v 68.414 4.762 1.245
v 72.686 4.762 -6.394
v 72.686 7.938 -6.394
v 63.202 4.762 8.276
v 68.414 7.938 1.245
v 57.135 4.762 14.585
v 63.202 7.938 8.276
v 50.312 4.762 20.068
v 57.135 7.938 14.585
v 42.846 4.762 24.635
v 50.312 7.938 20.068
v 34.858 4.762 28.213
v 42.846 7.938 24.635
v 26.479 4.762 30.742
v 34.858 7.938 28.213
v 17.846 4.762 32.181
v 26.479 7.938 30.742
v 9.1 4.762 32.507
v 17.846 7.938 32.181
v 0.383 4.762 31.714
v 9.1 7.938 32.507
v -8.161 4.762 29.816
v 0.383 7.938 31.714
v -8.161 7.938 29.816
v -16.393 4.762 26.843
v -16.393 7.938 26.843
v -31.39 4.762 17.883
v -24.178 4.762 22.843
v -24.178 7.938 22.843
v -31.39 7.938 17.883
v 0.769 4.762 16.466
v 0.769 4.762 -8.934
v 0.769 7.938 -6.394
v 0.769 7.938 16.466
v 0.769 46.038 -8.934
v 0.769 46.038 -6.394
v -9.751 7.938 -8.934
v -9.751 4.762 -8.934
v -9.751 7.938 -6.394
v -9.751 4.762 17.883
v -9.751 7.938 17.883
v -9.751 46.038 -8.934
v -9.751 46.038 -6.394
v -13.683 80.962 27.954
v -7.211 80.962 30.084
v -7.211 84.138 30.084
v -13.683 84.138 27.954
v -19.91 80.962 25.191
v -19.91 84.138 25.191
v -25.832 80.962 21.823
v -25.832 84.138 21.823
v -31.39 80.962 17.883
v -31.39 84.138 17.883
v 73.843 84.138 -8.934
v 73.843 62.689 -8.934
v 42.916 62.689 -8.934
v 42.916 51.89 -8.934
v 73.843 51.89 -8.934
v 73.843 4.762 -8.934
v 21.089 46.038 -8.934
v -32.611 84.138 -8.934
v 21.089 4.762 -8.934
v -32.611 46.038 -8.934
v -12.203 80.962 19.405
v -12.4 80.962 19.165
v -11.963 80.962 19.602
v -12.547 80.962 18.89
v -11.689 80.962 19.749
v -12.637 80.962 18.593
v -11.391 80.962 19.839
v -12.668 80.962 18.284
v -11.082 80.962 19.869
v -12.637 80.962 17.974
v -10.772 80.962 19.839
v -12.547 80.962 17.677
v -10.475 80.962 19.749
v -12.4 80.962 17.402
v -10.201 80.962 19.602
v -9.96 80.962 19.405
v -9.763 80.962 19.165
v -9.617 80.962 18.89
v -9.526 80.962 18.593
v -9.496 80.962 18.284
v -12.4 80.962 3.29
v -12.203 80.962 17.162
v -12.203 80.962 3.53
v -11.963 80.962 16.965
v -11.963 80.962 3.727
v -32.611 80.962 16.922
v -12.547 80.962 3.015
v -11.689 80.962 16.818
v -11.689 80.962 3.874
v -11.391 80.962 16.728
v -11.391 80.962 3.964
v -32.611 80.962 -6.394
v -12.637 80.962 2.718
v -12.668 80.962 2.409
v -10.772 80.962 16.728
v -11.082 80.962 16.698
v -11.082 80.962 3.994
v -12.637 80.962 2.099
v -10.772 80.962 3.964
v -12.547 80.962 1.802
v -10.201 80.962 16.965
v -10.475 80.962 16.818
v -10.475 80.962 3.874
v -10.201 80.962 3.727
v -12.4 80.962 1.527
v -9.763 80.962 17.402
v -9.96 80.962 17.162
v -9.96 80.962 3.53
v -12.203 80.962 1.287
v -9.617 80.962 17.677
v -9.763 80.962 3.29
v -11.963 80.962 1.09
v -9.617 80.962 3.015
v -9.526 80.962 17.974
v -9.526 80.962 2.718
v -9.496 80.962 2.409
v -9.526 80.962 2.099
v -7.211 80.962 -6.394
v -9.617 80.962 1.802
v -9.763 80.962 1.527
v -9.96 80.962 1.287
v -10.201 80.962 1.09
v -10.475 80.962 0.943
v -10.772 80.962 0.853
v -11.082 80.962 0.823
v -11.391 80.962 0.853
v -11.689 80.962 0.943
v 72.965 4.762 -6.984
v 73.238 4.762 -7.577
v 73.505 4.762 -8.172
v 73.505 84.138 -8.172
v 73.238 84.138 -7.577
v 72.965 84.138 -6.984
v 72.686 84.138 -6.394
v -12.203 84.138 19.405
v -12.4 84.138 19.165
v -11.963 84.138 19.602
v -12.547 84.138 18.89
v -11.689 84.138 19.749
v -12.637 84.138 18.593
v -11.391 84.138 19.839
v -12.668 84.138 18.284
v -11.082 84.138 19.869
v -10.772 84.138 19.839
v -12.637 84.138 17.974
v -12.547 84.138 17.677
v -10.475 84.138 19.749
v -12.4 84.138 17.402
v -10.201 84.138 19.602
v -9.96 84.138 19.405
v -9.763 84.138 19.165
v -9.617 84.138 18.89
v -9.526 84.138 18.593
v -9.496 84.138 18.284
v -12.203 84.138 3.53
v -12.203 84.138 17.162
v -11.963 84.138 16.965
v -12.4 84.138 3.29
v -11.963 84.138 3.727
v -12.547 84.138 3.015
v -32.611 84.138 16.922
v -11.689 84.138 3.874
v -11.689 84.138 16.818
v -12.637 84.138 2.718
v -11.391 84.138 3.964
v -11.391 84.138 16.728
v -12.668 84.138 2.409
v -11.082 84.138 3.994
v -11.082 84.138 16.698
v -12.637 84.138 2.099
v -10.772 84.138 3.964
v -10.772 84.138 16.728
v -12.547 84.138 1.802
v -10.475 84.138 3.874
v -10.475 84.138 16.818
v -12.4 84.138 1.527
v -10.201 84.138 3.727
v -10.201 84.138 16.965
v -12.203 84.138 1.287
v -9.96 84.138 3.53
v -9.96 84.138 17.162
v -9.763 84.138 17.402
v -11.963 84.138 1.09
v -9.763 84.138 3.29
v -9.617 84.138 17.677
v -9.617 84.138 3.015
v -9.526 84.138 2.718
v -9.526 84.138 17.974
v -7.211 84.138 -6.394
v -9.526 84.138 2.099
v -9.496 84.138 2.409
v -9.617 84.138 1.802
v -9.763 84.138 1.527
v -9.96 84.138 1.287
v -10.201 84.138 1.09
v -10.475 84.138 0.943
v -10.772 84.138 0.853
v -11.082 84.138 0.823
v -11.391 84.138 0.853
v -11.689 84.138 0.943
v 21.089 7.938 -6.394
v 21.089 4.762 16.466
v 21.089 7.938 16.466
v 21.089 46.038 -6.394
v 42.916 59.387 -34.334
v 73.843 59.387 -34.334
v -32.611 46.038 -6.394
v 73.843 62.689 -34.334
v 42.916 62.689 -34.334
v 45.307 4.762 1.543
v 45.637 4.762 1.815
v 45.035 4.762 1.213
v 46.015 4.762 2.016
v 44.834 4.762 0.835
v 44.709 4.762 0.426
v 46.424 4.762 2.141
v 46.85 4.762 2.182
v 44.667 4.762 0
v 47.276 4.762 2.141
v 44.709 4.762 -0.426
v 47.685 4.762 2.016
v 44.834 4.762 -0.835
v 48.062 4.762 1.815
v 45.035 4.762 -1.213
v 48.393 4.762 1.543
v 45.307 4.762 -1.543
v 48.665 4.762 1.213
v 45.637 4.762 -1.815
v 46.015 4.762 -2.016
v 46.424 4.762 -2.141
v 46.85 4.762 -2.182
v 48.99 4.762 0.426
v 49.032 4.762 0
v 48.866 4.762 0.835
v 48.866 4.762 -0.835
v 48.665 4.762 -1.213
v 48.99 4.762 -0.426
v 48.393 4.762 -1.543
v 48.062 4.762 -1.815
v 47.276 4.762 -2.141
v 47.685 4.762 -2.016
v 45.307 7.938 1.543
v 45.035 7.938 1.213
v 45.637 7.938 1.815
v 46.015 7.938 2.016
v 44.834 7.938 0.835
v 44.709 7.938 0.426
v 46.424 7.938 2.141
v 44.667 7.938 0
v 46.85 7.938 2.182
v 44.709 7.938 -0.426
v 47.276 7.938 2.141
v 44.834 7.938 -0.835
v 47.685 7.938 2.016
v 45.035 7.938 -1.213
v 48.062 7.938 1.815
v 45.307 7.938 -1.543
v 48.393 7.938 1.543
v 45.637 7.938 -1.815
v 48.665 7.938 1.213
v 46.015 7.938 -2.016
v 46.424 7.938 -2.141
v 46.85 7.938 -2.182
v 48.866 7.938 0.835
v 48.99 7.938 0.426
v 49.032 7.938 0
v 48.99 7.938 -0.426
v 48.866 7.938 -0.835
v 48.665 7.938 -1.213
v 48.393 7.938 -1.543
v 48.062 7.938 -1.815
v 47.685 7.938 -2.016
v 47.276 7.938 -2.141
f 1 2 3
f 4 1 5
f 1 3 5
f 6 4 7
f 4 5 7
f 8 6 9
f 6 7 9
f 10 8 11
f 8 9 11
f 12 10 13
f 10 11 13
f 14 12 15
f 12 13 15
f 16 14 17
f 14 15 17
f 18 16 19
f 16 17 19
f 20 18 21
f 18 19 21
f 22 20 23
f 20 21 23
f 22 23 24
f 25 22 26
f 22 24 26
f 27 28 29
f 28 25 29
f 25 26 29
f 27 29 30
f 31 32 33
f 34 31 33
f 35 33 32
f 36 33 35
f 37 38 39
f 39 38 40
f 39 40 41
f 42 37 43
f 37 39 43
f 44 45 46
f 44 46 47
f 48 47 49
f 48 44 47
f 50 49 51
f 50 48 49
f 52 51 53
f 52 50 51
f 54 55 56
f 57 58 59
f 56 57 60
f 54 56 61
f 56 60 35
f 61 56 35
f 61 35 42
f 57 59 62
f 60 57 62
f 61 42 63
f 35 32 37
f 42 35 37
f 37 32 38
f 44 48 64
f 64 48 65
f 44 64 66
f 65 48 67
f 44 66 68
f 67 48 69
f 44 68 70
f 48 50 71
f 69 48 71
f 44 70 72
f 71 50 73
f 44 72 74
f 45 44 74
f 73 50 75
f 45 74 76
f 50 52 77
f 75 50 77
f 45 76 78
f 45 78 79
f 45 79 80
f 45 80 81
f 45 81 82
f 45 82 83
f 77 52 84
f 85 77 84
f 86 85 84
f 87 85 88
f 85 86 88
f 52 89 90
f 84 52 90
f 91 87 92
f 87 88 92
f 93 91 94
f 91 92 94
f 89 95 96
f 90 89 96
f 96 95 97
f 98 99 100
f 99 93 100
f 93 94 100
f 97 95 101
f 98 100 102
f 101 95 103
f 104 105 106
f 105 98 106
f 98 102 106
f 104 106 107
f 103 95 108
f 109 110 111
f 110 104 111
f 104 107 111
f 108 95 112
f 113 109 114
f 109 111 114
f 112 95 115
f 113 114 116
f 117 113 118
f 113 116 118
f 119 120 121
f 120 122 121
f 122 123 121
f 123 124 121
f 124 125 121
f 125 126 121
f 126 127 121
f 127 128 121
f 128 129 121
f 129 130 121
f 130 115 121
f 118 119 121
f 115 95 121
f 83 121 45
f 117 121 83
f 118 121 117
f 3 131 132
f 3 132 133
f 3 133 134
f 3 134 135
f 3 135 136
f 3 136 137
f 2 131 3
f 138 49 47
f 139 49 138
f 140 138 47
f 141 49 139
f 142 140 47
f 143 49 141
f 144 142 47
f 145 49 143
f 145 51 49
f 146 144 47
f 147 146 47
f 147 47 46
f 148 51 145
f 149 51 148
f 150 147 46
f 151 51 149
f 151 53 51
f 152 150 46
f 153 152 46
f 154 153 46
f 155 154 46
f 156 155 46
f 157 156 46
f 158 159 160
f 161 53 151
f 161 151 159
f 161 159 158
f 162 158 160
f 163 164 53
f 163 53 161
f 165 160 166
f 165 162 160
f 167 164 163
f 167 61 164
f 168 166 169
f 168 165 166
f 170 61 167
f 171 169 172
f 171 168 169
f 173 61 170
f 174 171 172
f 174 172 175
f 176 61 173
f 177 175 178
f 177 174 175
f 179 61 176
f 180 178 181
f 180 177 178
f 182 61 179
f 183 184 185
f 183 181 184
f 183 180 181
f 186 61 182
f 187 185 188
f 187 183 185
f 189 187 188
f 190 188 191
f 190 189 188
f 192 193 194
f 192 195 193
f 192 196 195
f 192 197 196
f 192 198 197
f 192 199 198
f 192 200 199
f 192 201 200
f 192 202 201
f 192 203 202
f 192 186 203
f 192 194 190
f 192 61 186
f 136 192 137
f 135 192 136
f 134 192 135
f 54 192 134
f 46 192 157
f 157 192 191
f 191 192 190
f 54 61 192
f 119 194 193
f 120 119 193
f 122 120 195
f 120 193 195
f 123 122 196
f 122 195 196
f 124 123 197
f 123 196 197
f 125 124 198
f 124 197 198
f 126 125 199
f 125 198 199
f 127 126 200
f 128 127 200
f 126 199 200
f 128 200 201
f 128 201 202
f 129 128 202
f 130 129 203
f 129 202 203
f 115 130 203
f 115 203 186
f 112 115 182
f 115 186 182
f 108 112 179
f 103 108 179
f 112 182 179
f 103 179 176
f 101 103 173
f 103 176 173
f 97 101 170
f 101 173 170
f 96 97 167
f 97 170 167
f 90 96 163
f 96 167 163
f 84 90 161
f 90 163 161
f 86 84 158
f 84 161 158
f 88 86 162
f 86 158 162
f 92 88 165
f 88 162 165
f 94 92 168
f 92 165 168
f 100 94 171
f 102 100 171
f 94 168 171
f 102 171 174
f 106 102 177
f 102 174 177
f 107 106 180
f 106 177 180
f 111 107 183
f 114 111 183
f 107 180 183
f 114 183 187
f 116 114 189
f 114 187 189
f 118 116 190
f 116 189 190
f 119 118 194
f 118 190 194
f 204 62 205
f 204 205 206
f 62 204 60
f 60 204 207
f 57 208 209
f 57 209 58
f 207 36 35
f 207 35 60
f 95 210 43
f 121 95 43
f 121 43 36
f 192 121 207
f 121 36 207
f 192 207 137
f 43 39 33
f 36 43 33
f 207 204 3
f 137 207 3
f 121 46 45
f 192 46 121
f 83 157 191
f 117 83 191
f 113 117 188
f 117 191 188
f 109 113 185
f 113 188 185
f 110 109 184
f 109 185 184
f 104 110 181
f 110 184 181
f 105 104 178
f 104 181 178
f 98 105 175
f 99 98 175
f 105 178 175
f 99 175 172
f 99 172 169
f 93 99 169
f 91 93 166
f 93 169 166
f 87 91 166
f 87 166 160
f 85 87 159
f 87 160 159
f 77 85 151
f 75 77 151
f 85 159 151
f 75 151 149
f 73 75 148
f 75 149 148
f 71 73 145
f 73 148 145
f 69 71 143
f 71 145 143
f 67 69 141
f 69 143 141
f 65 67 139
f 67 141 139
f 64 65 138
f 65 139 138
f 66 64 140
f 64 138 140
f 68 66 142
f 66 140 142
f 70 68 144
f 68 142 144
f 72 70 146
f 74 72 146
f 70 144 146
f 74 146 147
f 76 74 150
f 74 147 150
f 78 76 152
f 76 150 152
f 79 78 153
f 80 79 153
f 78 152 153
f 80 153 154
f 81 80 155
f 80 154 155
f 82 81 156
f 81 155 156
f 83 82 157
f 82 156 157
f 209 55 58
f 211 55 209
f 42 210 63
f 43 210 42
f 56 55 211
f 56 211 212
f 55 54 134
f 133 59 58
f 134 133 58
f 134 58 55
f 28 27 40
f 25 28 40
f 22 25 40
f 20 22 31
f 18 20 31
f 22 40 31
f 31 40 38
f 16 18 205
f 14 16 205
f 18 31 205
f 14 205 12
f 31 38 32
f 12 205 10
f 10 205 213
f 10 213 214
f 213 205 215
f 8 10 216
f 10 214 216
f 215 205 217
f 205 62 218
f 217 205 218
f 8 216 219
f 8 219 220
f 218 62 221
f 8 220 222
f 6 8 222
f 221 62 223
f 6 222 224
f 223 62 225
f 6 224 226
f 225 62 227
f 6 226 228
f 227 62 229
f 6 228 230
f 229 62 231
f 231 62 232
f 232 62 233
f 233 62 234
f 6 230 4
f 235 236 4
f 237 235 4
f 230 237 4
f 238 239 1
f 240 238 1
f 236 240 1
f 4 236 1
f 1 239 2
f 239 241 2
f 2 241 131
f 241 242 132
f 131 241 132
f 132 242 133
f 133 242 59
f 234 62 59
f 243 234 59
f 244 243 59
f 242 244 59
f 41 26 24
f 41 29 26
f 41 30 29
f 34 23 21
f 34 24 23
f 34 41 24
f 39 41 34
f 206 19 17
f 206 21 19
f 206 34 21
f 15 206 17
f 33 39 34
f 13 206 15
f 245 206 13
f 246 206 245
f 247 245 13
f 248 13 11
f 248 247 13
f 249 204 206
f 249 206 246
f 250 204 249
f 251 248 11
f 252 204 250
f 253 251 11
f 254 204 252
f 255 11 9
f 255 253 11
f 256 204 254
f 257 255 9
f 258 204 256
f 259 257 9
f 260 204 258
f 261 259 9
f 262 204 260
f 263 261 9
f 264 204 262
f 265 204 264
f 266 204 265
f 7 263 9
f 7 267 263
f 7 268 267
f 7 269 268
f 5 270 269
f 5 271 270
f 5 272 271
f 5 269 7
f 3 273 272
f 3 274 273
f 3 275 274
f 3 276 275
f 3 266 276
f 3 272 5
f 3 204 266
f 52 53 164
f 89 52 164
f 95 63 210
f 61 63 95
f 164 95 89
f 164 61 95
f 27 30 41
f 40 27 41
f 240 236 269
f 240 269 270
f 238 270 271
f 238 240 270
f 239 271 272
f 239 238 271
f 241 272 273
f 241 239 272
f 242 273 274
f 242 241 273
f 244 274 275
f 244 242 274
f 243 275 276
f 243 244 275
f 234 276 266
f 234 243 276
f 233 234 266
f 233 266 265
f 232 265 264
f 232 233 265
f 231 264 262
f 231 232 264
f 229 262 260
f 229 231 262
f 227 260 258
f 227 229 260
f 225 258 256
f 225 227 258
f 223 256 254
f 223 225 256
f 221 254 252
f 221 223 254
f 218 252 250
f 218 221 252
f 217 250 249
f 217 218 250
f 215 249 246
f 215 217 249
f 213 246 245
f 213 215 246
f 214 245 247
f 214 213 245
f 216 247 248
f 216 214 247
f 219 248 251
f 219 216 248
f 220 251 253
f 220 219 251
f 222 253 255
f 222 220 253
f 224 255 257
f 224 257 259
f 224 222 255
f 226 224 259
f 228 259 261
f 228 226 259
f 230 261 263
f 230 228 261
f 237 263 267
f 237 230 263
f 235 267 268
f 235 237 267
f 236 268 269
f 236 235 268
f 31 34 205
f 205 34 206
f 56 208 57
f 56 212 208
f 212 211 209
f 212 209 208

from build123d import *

# Parameters (mm, degrees)
SKETCH1_R               = 5.357495
SKETCH1_R_2             = 2.182495
RAISER_DEPTH            = 4.7625
RAISER_2_DEPTH          = 4.7625
SKETCH3_R               = 2.182495
PLATFORM_DEPTH          = 3.175
WALLS_DEPTH             = 76.2
SKETCH9_W               = 31.75
SKETCH9_H               = 3.302
BOSS_EXTRUDE4_DEPTH     = 25.4
BOSS_EXTRUDE5_DEPTH     = 31.75
BOSS_EXTRUDE6_DEPTH     = 3.175
SKETCH13_R              = 1.585905821
CUT_EXTRUDE1_DEPTH      = 3.175
SKETCH14_W              = 22.86
SKETCH14_H              = 38.1
CUT_EXTRUDE2_DEPTH      = 2.54
SKETCH16_W              = 22.86
SKETCH16_H              = 26.817011057
CUT_EXTRUDE3_DEPTH      = 5080
SKETCH17_W              = 20.32
SKETCH17_H              = 38.1
CUT_EXTRUDE4_DEPTH      = 2.54
SKETCH18_W              = 20.32
SKETCH18_H              = 25.4
CUT_EXTRUDE5_DEPTH      = 8.9375
SKETCH21_R              = 23.434999297
CUT_EXTRUDE6_DEPTH      = 5.7625
CUT_EXTRUDE7_DEPTH      = 77.2
CUT_EXTRUDE7_DEPTH_BACK = 4.175
SKETCH23_W              = 0.822798121
SKETCH23_H              = 25.4
CUT_EXTRUDE8_DEPTH      = 22.448562342
CUT_EXTRUDE8_DEPTH_BACK = 58.926437658
CUT_EXTRUDE9_DEPTH      = 1
CUT_EXTRUDE9_DEPTH_BACK = 80.375


with BuildPart() as part:
    # Sketch1 → Raiser (new body)
    with BuildSketch(Plane(origin=(0, 0, 0), x_dir=(1, 0, 0), z_dir=(0, 1, 0))):
        with Locations((-24.991443565, 0)):
            Circle(SKETCH1_R)
        with Locations((-24.991443565, 0)):
            Circle(SKETCH1_R_2, mode=Mode.SUBTRACT)
    extrude(amount=RAISER_DEPTH)



with BuildPart() as body_2:
    # Sketch1 → Raiser 2 (new body)
    with BuildSketch(Plane(origin=(0, 0, 0), x_dir=(1, 0, 0), z_dir=(0, 1, 0))):
        with Locations((46.849916435, 0)):
            Circle(SKETCH1_R)
        with Locations((46.849916435, 0)):
            Circle(SKETCH1_R_2, mode=Mode.SUBTRACT)
    extrude(amount=RAISER_2_DEPTH)


with BuildPart() as part_1:
    add(part.part)

    add(body_2.part)  # Platform merges body 2
    # Sketch3 → Platform (add)
    with BuildSketch(Plane(origin=(0, 4.7625, 0), x_dir=(1, 0, 0), z_dir=(0, 1, 0))):
        with BuildLine():
            Line((-32.611443565, 8.933868965), (-32.611443565, -17.883142092))
            ThreePointArc((-32.611443565, -17.883142092), (27.714936864, -31.227394881), (74.666125822, 8.933868965))
            Line((74.666125822, 8.933868965), (-32.611443565, 8.933868965))
        make_face()
        with Locations((-24.991443565, 0)):
            Circle(SKETCH3_R, mode=Mode.SUBTRACT)
        with Locations((46.849916435, 0)):
            Circle(SKETCH3_R, mode=Mode.SUBTRACT)
    extrude(amount=PLATFORM_DEPTH)

    # Sketch7 → Walls (add)
    with BuildSketch(Plane(origin=(0, 7.9375, 0), x_dir=(1, 0, 0), z_dir=(0, 1, 0))):
        with BuildLine():
            Line((74.666125822, 8.933868965), (-32.611443565, 8.933868965))
            Line((-32.611443565, 8.933868965), (-32.611443565, 6.393868965))
            Line((-32.611443565, 6.393868965), (-30.071443565, 6.393868965))
            Line((-30.071443565, 6.393868965), (73.529899121, 6.393868965))
            ThreePointArc((73.529899121, 6.393868965), (74.110777774, 7.65815862), (74.666125822, 8.933868965))
        make_face()
    extrude(amount=WALLS_DEPTH)

    # Sketch9 → Boss-Extrude4 (add)
    with BuildSketch(Plane(origin=(0, 0, -8.933868965), x_dir=(-1, 0, 0), z_dir=(0, 0, -1))):
        with Locations((-58.791125822, 61.037937658)):
            Rectangle(SKETCH9_W, SKETCH9_H)
    extrude(amount=BOSS_EXTRUDE4_DEPTH)

    # Sketch10 → Boss-Extrude5 (add)
    with BuildSketch(Plane.ZY.offset(-42.916125822)):
        Polygon((-34.333868965, 59.386937658), (-8.933868965, 51.890363409), (-8.933868965, 59.386937658), align=None)
    extrude(amount=-BOSS_EXTRUDE5_DEPTH)

    # Sketch12 → Boss-Extrude6 (add)
    with BuildSketch(Plane(origin=(0, 84.1375, 0), x_dir=(1, 0, 0), z_dir=(0, 1, 0))):
        with BuildLine():
            Line((-32.611443565, 6.393868965), (-32.611443565, -17.883142092))
            ThreePointArc((-32.611443565, -17.883142092), (-20.588039105, -25.701496657), (-7.211443565, -30.874079638))
            Line((-7.211443565, -30.874079638), (-7.211443565, 6.393868965))
            Line((-7.211443565, 6.393868965), (-32.611443565, 6.393868965))
        make_face()
    extrude(amount=-BOSS_EXTRUDE6_DEPTH)

    # Sketch13 → Cut-Extrude1 (cut)
    with BuildSketch(Plane(origin=(0, 84.1375, 0), x_dir=(1, 0, 0), z_dir=(0, 1, 0))):
        with Locations((-11.081791728, -2.408517057)):
            Circle(SKETCH13_R)
        with Locations((-11.081791728, -18.283517057)):
            Circle(SKETCH13_R)
    extrude(amount=-CUT_EXTRUDE1_DEPTH, mode=Mode.SUBTRACT)

    # Sketch14 → Cut-Extrude2 (cut)
    with BuildSketch(Plane.XY.offset(-6.393868965)):
        with Locations((-21.181443565, 26.9875)):
            Rectangle(SKETCH14_W, SKETCH14_H)
    extrude(amount=-CUT_EXTRUDE2_DEPTH, mode=Mode.SUBTRACT)

    # Sketch16 → Cut-Extrude3 (cut)
    with BuildSketch(Plane(origin=(0, 7.9375, 0), x_dir=(1, 0, 0), z_dir=(0, 1, 0))):
        with Locations((-21.181443565, -4.474636563)):
            Rectangle(SKETCH16_W, SKETCH16_H)
    extrude(amount=-CUT_EXTRUDE3_DEPTH, mode=Mode.SUBTRACT)

    # Sketch17 → Cut-Extrude4 (cut)
    with BuildSketch(Plane.XY.offset(-6.393868965)):
        with Locations((10.929236435, 26.9875)):
            Rectangle(SKETCH17_W, SKETCH17_H)
    extrude(amount=-CUT_EXTRUDE4_DEPTH, mode=Mode.SUBTRACT)

    # Sketch18 → Cut-Extrude5 (cut, through all)
    with BuildSketch(Plane(origin=(0, 7.9375, 0), x_dir=(1, 0, 0), z_dir=(0, 1, 0))):
        with Locations((10.929236435, -3.766131035)):
            Rectangle(SKETCH18_W, SKETCH18_H)
    extrude(amount=-CUT_EXTRUDE5_DEPTH, mode=Mode.SUBTRACT)

    # Sketch21 → Cut-Extrude6 (cut, through all)
    with BuildSketch(Plane.XZ.offset(-4.7625)):
        with Locations((35.627803811, 7.157128957)):
            Circle(SKETCH21_R)
    extrude(amount=CUT_EXTRUDE6_DEPTH, mode=Mode.SUBTRACT)

    # Sketch22 → Cut-Extrude7 (cut, two sides)
    with BuildSketch(Plane(origin=(0, 7.9375, 0), x_dir=(1, 0, 0), z_dir=(0, 1, 0))) as cut_extrude7_sk:
        with BuildLine():
            ThreePointArc((72.686340907, 6.393868965), (26.479298711, -30.742030079), (-31.389645862, -17.883142092))
            Line((-31.389645862, -17.883142092), (-32.611443565, -17.883142092))
            ThreePointArc((-32.611443565, -17.883142092), (26.361801078, -31.551234168), (73.529899121, 6.393868965))
            Line((73.529899121, 6.393868965), (72.686340907, 6.393868965))
        make_face()
        with BuildLine():
            ThreePointArc((73.505417676, 8.171868965), (73.102235438, 7.279940859), (72.686340907, 6.393868965))
            Line((72.686340907, 6.393868965), (73.529899121, 6.393868965))
            ThreePointArc((73.529899121, 6.393868965), (74.110777774, 7.65815862), (74.666125822, 8.933868965))
            Line((74.666125822, 8.933868965), (73.843327701, 8.933868965))
            Line((73.843327701, 8.933868965), (73.505417676, 8.171868965))
        make_face()
    extrude(amount=CUT_EXTRUDE7_DEPTH, mode=Mode.SUBTRACT)
    extrude(cut_extrude7_sk.sketch, amount=-CUT_EXTRUDE7_DEPTH_BACK, mode=Mode.SUBTRACT)

    # Sketch23 → Cut-Extrude8 (cut, two sides)
    with BuildSketch(Plane(origin=(0, 62.688937658, 0), x_dir=(1, 0, 0), z_dir=(0, 1, 0))) as cut_extrude8_sk:
        with Locations((74.254726761, 21.633868965)):
            Rectangle(SKETCH23_W, SKETCH23_H)
    extrude(amount=CUT_EXTRUDE8_DEPTH, mode=Mode.SUBTRACT)
    extrude(cut_extrude8_sk.sketch, amount=-CUT_EXTRUDE8_DEPTH_BACK, mode=Mode.SUBTRACT)

    # Sketch24 → Cut-Extrude9 (cut, two sides)
    with BuildSketch(Plane(origin=(0, 84.1375, 0), x_dir=(1, 0, 0), z_dir=(0, 1, 0))) as cut_extrude9_sk:
        Polygon((-32.611443565, -16.922161086), (-32.611443565, -17.883142092), (-31.389645862, -17.883142092), align=None)
    extrude(amount=CUT_EXTRUDE9_DEPTH, mode=Mode.SUBTRACT)
    extrude(cut_extrude9_sk.sketch, amount=-CUT_EXTRUDE9_DEPTH_BACK, mode=Mode.SUBTRACT)


solid = part_1.part
